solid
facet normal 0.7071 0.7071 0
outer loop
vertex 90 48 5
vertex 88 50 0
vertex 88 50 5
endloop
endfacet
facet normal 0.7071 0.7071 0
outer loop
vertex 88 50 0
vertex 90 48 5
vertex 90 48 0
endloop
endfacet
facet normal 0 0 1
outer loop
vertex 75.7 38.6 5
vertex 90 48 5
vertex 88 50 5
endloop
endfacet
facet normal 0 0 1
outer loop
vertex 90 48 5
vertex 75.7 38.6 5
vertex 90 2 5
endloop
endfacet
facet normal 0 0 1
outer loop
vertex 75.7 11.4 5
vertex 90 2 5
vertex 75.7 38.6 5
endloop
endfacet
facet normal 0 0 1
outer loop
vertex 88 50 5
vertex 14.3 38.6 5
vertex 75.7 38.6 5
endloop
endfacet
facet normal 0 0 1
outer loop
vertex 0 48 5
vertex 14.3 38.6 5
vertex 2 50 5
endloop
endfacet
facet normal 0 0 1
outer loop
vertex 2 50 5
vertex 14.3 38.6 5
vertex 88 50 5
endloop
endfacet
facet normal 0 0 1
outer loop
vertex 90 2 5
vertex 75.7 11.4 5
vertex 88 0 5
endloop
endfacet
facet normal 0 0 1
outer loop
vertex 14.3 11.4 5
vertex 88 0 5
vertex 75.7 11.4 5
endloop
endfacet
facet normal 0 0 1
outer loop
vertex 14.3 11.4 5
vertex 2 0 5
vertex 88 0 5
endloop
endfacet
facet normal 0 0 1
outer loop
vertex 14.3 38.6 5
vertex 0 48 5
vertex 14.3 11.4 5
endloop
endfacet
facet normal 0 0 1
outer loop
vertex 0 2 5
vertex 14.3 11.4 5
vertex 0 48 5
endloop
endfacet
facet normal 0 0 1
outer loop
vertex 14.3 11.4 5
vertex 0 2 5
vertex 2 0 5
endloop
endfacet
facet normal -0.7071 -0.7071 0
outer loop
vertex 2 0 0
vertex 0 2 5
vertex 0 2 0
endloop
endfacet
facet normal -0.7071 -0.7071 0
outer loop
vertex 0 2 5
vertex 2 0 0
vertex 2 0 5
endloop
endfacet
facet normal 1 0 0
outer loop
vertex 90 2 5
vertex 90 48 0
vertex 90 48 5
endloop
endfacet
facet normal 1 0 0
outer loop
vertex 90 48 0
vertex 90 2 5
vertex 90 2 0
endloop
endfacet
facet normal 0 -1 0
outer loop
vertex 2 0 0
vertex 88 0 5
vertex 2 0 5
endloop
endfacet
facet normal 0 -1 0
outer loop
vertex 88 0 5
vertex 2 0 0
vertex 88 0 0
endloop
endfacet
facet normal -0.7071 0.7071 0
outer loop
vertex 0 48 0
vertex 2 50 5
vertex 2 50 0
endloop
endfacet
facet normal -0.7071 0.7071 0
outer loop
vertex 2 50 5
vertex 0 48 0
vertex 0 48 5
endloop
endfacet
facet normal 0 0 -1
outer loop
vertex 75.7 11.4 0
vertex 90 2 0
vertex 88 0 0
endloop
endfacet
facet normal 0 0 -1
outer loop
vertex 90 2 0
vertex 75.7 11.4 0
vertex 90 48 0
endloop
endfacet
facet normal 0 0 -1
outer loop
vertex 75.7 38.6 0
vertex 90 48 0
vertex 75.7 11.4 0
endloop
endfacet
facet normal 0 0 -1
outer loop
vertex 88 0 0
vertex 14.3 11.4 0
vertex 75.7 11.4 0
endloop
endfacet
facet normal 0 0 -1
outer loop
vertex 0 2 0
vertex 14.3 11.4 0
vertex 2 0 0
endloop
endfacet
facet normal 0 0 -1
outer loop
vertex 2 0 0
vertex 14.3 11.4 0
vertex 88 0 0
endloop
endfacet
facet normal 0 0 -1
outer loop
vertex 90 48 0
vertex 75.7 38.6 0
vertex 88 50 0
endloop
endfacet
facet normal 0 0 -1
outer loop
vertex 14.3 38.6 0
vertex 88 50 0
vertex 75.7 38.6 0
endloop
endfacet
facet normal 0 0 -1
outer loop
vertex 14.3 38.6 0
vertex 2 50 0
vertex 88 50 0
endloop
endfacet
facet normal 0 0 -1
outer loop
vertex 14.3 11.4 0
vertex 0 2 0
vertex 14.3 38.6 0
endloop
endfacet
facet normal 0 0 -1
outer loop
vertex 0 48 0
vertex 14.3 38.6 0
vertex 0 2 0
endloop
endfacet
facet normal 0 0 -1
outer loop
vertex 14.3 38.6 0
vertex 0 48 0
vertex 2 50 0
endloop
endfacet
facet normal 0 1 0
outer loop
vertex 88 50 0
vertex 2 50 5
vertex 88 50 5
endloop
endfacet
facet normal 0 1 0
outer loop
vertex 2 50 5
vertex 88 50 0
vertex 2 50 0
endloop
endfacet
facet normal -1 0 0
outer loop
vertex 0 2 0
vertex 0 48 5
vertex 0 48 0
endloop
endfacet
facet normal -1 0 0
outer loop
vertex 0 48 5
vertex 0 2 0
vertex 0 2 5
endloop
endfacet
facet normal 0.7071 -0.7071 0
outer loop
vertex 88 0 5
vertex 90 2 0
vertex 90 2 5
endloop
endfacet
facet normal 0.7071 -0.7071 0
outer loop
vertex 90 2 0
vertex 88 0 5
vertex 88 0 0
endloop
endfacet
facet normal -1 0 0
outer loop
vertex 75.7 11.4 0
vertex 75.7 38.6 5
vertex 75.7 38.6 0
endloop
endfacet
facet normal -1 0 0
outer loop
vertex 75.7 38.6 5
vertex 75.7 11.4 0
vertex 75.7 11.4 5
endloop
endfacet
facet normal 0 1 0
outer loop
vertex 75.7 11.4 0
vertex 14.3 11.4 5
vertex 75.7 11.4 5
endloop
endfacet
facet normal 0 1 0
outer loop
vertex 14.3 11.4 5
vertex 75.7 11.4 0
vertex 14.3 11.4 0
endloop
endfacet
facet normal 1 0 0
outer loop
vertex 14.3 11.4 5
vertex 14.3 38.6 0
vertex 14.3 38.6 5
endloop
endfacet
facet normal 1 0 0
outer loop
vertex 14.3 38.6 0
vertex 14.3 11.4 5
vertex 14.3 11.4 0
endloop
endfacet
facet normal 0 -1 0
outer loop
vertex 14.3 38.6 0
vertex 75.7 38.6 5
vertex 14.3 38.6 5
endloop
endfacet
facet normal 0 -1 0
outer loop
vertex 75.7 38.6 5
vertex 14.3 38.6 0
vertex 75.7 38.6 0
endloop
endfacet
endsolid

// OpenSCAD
$fn = 32;

// ----------------------------------------------------------------------
// Windowed plate: 1 voids, 90 x 50 x 5 mm
// ----------------------------------------------------------------------

// --- parameters (mm) ---
plate_l = 90;             // plate length, X
plate_w = 50;             // plate width, Y
plate_t = 5;              // plate thickness, Z
edge_margin = 8;          // wall from the plate edge to any window
win1_l = 61.4;            // window length
win1_w = 27.2;            // window width
depth_1 = 5;              // depth of void 1 (full thickness = through)
corner_c = 2;             // corner chamfer of the plate

profile = [[2, 0], [88, 0], [90, 2], [90, 48], [88, 50], [2, 50], [0, 48], [0, 2]];  // primary outline, 8 points, counter clockwise
void_1 = [[14.3, 11.4], [75.7, 11.4], [75.7, 38.6], [14.3, 38.6]];  // large central window, 4 points

// --- the one profile operation ---
difference() {
  linear_extrude(height = plate_t) polygon(points = profile);
  translate([0, 0, -1])
    linear_extrude(height = plate_t + 2) polygon(points = void_1);
}
